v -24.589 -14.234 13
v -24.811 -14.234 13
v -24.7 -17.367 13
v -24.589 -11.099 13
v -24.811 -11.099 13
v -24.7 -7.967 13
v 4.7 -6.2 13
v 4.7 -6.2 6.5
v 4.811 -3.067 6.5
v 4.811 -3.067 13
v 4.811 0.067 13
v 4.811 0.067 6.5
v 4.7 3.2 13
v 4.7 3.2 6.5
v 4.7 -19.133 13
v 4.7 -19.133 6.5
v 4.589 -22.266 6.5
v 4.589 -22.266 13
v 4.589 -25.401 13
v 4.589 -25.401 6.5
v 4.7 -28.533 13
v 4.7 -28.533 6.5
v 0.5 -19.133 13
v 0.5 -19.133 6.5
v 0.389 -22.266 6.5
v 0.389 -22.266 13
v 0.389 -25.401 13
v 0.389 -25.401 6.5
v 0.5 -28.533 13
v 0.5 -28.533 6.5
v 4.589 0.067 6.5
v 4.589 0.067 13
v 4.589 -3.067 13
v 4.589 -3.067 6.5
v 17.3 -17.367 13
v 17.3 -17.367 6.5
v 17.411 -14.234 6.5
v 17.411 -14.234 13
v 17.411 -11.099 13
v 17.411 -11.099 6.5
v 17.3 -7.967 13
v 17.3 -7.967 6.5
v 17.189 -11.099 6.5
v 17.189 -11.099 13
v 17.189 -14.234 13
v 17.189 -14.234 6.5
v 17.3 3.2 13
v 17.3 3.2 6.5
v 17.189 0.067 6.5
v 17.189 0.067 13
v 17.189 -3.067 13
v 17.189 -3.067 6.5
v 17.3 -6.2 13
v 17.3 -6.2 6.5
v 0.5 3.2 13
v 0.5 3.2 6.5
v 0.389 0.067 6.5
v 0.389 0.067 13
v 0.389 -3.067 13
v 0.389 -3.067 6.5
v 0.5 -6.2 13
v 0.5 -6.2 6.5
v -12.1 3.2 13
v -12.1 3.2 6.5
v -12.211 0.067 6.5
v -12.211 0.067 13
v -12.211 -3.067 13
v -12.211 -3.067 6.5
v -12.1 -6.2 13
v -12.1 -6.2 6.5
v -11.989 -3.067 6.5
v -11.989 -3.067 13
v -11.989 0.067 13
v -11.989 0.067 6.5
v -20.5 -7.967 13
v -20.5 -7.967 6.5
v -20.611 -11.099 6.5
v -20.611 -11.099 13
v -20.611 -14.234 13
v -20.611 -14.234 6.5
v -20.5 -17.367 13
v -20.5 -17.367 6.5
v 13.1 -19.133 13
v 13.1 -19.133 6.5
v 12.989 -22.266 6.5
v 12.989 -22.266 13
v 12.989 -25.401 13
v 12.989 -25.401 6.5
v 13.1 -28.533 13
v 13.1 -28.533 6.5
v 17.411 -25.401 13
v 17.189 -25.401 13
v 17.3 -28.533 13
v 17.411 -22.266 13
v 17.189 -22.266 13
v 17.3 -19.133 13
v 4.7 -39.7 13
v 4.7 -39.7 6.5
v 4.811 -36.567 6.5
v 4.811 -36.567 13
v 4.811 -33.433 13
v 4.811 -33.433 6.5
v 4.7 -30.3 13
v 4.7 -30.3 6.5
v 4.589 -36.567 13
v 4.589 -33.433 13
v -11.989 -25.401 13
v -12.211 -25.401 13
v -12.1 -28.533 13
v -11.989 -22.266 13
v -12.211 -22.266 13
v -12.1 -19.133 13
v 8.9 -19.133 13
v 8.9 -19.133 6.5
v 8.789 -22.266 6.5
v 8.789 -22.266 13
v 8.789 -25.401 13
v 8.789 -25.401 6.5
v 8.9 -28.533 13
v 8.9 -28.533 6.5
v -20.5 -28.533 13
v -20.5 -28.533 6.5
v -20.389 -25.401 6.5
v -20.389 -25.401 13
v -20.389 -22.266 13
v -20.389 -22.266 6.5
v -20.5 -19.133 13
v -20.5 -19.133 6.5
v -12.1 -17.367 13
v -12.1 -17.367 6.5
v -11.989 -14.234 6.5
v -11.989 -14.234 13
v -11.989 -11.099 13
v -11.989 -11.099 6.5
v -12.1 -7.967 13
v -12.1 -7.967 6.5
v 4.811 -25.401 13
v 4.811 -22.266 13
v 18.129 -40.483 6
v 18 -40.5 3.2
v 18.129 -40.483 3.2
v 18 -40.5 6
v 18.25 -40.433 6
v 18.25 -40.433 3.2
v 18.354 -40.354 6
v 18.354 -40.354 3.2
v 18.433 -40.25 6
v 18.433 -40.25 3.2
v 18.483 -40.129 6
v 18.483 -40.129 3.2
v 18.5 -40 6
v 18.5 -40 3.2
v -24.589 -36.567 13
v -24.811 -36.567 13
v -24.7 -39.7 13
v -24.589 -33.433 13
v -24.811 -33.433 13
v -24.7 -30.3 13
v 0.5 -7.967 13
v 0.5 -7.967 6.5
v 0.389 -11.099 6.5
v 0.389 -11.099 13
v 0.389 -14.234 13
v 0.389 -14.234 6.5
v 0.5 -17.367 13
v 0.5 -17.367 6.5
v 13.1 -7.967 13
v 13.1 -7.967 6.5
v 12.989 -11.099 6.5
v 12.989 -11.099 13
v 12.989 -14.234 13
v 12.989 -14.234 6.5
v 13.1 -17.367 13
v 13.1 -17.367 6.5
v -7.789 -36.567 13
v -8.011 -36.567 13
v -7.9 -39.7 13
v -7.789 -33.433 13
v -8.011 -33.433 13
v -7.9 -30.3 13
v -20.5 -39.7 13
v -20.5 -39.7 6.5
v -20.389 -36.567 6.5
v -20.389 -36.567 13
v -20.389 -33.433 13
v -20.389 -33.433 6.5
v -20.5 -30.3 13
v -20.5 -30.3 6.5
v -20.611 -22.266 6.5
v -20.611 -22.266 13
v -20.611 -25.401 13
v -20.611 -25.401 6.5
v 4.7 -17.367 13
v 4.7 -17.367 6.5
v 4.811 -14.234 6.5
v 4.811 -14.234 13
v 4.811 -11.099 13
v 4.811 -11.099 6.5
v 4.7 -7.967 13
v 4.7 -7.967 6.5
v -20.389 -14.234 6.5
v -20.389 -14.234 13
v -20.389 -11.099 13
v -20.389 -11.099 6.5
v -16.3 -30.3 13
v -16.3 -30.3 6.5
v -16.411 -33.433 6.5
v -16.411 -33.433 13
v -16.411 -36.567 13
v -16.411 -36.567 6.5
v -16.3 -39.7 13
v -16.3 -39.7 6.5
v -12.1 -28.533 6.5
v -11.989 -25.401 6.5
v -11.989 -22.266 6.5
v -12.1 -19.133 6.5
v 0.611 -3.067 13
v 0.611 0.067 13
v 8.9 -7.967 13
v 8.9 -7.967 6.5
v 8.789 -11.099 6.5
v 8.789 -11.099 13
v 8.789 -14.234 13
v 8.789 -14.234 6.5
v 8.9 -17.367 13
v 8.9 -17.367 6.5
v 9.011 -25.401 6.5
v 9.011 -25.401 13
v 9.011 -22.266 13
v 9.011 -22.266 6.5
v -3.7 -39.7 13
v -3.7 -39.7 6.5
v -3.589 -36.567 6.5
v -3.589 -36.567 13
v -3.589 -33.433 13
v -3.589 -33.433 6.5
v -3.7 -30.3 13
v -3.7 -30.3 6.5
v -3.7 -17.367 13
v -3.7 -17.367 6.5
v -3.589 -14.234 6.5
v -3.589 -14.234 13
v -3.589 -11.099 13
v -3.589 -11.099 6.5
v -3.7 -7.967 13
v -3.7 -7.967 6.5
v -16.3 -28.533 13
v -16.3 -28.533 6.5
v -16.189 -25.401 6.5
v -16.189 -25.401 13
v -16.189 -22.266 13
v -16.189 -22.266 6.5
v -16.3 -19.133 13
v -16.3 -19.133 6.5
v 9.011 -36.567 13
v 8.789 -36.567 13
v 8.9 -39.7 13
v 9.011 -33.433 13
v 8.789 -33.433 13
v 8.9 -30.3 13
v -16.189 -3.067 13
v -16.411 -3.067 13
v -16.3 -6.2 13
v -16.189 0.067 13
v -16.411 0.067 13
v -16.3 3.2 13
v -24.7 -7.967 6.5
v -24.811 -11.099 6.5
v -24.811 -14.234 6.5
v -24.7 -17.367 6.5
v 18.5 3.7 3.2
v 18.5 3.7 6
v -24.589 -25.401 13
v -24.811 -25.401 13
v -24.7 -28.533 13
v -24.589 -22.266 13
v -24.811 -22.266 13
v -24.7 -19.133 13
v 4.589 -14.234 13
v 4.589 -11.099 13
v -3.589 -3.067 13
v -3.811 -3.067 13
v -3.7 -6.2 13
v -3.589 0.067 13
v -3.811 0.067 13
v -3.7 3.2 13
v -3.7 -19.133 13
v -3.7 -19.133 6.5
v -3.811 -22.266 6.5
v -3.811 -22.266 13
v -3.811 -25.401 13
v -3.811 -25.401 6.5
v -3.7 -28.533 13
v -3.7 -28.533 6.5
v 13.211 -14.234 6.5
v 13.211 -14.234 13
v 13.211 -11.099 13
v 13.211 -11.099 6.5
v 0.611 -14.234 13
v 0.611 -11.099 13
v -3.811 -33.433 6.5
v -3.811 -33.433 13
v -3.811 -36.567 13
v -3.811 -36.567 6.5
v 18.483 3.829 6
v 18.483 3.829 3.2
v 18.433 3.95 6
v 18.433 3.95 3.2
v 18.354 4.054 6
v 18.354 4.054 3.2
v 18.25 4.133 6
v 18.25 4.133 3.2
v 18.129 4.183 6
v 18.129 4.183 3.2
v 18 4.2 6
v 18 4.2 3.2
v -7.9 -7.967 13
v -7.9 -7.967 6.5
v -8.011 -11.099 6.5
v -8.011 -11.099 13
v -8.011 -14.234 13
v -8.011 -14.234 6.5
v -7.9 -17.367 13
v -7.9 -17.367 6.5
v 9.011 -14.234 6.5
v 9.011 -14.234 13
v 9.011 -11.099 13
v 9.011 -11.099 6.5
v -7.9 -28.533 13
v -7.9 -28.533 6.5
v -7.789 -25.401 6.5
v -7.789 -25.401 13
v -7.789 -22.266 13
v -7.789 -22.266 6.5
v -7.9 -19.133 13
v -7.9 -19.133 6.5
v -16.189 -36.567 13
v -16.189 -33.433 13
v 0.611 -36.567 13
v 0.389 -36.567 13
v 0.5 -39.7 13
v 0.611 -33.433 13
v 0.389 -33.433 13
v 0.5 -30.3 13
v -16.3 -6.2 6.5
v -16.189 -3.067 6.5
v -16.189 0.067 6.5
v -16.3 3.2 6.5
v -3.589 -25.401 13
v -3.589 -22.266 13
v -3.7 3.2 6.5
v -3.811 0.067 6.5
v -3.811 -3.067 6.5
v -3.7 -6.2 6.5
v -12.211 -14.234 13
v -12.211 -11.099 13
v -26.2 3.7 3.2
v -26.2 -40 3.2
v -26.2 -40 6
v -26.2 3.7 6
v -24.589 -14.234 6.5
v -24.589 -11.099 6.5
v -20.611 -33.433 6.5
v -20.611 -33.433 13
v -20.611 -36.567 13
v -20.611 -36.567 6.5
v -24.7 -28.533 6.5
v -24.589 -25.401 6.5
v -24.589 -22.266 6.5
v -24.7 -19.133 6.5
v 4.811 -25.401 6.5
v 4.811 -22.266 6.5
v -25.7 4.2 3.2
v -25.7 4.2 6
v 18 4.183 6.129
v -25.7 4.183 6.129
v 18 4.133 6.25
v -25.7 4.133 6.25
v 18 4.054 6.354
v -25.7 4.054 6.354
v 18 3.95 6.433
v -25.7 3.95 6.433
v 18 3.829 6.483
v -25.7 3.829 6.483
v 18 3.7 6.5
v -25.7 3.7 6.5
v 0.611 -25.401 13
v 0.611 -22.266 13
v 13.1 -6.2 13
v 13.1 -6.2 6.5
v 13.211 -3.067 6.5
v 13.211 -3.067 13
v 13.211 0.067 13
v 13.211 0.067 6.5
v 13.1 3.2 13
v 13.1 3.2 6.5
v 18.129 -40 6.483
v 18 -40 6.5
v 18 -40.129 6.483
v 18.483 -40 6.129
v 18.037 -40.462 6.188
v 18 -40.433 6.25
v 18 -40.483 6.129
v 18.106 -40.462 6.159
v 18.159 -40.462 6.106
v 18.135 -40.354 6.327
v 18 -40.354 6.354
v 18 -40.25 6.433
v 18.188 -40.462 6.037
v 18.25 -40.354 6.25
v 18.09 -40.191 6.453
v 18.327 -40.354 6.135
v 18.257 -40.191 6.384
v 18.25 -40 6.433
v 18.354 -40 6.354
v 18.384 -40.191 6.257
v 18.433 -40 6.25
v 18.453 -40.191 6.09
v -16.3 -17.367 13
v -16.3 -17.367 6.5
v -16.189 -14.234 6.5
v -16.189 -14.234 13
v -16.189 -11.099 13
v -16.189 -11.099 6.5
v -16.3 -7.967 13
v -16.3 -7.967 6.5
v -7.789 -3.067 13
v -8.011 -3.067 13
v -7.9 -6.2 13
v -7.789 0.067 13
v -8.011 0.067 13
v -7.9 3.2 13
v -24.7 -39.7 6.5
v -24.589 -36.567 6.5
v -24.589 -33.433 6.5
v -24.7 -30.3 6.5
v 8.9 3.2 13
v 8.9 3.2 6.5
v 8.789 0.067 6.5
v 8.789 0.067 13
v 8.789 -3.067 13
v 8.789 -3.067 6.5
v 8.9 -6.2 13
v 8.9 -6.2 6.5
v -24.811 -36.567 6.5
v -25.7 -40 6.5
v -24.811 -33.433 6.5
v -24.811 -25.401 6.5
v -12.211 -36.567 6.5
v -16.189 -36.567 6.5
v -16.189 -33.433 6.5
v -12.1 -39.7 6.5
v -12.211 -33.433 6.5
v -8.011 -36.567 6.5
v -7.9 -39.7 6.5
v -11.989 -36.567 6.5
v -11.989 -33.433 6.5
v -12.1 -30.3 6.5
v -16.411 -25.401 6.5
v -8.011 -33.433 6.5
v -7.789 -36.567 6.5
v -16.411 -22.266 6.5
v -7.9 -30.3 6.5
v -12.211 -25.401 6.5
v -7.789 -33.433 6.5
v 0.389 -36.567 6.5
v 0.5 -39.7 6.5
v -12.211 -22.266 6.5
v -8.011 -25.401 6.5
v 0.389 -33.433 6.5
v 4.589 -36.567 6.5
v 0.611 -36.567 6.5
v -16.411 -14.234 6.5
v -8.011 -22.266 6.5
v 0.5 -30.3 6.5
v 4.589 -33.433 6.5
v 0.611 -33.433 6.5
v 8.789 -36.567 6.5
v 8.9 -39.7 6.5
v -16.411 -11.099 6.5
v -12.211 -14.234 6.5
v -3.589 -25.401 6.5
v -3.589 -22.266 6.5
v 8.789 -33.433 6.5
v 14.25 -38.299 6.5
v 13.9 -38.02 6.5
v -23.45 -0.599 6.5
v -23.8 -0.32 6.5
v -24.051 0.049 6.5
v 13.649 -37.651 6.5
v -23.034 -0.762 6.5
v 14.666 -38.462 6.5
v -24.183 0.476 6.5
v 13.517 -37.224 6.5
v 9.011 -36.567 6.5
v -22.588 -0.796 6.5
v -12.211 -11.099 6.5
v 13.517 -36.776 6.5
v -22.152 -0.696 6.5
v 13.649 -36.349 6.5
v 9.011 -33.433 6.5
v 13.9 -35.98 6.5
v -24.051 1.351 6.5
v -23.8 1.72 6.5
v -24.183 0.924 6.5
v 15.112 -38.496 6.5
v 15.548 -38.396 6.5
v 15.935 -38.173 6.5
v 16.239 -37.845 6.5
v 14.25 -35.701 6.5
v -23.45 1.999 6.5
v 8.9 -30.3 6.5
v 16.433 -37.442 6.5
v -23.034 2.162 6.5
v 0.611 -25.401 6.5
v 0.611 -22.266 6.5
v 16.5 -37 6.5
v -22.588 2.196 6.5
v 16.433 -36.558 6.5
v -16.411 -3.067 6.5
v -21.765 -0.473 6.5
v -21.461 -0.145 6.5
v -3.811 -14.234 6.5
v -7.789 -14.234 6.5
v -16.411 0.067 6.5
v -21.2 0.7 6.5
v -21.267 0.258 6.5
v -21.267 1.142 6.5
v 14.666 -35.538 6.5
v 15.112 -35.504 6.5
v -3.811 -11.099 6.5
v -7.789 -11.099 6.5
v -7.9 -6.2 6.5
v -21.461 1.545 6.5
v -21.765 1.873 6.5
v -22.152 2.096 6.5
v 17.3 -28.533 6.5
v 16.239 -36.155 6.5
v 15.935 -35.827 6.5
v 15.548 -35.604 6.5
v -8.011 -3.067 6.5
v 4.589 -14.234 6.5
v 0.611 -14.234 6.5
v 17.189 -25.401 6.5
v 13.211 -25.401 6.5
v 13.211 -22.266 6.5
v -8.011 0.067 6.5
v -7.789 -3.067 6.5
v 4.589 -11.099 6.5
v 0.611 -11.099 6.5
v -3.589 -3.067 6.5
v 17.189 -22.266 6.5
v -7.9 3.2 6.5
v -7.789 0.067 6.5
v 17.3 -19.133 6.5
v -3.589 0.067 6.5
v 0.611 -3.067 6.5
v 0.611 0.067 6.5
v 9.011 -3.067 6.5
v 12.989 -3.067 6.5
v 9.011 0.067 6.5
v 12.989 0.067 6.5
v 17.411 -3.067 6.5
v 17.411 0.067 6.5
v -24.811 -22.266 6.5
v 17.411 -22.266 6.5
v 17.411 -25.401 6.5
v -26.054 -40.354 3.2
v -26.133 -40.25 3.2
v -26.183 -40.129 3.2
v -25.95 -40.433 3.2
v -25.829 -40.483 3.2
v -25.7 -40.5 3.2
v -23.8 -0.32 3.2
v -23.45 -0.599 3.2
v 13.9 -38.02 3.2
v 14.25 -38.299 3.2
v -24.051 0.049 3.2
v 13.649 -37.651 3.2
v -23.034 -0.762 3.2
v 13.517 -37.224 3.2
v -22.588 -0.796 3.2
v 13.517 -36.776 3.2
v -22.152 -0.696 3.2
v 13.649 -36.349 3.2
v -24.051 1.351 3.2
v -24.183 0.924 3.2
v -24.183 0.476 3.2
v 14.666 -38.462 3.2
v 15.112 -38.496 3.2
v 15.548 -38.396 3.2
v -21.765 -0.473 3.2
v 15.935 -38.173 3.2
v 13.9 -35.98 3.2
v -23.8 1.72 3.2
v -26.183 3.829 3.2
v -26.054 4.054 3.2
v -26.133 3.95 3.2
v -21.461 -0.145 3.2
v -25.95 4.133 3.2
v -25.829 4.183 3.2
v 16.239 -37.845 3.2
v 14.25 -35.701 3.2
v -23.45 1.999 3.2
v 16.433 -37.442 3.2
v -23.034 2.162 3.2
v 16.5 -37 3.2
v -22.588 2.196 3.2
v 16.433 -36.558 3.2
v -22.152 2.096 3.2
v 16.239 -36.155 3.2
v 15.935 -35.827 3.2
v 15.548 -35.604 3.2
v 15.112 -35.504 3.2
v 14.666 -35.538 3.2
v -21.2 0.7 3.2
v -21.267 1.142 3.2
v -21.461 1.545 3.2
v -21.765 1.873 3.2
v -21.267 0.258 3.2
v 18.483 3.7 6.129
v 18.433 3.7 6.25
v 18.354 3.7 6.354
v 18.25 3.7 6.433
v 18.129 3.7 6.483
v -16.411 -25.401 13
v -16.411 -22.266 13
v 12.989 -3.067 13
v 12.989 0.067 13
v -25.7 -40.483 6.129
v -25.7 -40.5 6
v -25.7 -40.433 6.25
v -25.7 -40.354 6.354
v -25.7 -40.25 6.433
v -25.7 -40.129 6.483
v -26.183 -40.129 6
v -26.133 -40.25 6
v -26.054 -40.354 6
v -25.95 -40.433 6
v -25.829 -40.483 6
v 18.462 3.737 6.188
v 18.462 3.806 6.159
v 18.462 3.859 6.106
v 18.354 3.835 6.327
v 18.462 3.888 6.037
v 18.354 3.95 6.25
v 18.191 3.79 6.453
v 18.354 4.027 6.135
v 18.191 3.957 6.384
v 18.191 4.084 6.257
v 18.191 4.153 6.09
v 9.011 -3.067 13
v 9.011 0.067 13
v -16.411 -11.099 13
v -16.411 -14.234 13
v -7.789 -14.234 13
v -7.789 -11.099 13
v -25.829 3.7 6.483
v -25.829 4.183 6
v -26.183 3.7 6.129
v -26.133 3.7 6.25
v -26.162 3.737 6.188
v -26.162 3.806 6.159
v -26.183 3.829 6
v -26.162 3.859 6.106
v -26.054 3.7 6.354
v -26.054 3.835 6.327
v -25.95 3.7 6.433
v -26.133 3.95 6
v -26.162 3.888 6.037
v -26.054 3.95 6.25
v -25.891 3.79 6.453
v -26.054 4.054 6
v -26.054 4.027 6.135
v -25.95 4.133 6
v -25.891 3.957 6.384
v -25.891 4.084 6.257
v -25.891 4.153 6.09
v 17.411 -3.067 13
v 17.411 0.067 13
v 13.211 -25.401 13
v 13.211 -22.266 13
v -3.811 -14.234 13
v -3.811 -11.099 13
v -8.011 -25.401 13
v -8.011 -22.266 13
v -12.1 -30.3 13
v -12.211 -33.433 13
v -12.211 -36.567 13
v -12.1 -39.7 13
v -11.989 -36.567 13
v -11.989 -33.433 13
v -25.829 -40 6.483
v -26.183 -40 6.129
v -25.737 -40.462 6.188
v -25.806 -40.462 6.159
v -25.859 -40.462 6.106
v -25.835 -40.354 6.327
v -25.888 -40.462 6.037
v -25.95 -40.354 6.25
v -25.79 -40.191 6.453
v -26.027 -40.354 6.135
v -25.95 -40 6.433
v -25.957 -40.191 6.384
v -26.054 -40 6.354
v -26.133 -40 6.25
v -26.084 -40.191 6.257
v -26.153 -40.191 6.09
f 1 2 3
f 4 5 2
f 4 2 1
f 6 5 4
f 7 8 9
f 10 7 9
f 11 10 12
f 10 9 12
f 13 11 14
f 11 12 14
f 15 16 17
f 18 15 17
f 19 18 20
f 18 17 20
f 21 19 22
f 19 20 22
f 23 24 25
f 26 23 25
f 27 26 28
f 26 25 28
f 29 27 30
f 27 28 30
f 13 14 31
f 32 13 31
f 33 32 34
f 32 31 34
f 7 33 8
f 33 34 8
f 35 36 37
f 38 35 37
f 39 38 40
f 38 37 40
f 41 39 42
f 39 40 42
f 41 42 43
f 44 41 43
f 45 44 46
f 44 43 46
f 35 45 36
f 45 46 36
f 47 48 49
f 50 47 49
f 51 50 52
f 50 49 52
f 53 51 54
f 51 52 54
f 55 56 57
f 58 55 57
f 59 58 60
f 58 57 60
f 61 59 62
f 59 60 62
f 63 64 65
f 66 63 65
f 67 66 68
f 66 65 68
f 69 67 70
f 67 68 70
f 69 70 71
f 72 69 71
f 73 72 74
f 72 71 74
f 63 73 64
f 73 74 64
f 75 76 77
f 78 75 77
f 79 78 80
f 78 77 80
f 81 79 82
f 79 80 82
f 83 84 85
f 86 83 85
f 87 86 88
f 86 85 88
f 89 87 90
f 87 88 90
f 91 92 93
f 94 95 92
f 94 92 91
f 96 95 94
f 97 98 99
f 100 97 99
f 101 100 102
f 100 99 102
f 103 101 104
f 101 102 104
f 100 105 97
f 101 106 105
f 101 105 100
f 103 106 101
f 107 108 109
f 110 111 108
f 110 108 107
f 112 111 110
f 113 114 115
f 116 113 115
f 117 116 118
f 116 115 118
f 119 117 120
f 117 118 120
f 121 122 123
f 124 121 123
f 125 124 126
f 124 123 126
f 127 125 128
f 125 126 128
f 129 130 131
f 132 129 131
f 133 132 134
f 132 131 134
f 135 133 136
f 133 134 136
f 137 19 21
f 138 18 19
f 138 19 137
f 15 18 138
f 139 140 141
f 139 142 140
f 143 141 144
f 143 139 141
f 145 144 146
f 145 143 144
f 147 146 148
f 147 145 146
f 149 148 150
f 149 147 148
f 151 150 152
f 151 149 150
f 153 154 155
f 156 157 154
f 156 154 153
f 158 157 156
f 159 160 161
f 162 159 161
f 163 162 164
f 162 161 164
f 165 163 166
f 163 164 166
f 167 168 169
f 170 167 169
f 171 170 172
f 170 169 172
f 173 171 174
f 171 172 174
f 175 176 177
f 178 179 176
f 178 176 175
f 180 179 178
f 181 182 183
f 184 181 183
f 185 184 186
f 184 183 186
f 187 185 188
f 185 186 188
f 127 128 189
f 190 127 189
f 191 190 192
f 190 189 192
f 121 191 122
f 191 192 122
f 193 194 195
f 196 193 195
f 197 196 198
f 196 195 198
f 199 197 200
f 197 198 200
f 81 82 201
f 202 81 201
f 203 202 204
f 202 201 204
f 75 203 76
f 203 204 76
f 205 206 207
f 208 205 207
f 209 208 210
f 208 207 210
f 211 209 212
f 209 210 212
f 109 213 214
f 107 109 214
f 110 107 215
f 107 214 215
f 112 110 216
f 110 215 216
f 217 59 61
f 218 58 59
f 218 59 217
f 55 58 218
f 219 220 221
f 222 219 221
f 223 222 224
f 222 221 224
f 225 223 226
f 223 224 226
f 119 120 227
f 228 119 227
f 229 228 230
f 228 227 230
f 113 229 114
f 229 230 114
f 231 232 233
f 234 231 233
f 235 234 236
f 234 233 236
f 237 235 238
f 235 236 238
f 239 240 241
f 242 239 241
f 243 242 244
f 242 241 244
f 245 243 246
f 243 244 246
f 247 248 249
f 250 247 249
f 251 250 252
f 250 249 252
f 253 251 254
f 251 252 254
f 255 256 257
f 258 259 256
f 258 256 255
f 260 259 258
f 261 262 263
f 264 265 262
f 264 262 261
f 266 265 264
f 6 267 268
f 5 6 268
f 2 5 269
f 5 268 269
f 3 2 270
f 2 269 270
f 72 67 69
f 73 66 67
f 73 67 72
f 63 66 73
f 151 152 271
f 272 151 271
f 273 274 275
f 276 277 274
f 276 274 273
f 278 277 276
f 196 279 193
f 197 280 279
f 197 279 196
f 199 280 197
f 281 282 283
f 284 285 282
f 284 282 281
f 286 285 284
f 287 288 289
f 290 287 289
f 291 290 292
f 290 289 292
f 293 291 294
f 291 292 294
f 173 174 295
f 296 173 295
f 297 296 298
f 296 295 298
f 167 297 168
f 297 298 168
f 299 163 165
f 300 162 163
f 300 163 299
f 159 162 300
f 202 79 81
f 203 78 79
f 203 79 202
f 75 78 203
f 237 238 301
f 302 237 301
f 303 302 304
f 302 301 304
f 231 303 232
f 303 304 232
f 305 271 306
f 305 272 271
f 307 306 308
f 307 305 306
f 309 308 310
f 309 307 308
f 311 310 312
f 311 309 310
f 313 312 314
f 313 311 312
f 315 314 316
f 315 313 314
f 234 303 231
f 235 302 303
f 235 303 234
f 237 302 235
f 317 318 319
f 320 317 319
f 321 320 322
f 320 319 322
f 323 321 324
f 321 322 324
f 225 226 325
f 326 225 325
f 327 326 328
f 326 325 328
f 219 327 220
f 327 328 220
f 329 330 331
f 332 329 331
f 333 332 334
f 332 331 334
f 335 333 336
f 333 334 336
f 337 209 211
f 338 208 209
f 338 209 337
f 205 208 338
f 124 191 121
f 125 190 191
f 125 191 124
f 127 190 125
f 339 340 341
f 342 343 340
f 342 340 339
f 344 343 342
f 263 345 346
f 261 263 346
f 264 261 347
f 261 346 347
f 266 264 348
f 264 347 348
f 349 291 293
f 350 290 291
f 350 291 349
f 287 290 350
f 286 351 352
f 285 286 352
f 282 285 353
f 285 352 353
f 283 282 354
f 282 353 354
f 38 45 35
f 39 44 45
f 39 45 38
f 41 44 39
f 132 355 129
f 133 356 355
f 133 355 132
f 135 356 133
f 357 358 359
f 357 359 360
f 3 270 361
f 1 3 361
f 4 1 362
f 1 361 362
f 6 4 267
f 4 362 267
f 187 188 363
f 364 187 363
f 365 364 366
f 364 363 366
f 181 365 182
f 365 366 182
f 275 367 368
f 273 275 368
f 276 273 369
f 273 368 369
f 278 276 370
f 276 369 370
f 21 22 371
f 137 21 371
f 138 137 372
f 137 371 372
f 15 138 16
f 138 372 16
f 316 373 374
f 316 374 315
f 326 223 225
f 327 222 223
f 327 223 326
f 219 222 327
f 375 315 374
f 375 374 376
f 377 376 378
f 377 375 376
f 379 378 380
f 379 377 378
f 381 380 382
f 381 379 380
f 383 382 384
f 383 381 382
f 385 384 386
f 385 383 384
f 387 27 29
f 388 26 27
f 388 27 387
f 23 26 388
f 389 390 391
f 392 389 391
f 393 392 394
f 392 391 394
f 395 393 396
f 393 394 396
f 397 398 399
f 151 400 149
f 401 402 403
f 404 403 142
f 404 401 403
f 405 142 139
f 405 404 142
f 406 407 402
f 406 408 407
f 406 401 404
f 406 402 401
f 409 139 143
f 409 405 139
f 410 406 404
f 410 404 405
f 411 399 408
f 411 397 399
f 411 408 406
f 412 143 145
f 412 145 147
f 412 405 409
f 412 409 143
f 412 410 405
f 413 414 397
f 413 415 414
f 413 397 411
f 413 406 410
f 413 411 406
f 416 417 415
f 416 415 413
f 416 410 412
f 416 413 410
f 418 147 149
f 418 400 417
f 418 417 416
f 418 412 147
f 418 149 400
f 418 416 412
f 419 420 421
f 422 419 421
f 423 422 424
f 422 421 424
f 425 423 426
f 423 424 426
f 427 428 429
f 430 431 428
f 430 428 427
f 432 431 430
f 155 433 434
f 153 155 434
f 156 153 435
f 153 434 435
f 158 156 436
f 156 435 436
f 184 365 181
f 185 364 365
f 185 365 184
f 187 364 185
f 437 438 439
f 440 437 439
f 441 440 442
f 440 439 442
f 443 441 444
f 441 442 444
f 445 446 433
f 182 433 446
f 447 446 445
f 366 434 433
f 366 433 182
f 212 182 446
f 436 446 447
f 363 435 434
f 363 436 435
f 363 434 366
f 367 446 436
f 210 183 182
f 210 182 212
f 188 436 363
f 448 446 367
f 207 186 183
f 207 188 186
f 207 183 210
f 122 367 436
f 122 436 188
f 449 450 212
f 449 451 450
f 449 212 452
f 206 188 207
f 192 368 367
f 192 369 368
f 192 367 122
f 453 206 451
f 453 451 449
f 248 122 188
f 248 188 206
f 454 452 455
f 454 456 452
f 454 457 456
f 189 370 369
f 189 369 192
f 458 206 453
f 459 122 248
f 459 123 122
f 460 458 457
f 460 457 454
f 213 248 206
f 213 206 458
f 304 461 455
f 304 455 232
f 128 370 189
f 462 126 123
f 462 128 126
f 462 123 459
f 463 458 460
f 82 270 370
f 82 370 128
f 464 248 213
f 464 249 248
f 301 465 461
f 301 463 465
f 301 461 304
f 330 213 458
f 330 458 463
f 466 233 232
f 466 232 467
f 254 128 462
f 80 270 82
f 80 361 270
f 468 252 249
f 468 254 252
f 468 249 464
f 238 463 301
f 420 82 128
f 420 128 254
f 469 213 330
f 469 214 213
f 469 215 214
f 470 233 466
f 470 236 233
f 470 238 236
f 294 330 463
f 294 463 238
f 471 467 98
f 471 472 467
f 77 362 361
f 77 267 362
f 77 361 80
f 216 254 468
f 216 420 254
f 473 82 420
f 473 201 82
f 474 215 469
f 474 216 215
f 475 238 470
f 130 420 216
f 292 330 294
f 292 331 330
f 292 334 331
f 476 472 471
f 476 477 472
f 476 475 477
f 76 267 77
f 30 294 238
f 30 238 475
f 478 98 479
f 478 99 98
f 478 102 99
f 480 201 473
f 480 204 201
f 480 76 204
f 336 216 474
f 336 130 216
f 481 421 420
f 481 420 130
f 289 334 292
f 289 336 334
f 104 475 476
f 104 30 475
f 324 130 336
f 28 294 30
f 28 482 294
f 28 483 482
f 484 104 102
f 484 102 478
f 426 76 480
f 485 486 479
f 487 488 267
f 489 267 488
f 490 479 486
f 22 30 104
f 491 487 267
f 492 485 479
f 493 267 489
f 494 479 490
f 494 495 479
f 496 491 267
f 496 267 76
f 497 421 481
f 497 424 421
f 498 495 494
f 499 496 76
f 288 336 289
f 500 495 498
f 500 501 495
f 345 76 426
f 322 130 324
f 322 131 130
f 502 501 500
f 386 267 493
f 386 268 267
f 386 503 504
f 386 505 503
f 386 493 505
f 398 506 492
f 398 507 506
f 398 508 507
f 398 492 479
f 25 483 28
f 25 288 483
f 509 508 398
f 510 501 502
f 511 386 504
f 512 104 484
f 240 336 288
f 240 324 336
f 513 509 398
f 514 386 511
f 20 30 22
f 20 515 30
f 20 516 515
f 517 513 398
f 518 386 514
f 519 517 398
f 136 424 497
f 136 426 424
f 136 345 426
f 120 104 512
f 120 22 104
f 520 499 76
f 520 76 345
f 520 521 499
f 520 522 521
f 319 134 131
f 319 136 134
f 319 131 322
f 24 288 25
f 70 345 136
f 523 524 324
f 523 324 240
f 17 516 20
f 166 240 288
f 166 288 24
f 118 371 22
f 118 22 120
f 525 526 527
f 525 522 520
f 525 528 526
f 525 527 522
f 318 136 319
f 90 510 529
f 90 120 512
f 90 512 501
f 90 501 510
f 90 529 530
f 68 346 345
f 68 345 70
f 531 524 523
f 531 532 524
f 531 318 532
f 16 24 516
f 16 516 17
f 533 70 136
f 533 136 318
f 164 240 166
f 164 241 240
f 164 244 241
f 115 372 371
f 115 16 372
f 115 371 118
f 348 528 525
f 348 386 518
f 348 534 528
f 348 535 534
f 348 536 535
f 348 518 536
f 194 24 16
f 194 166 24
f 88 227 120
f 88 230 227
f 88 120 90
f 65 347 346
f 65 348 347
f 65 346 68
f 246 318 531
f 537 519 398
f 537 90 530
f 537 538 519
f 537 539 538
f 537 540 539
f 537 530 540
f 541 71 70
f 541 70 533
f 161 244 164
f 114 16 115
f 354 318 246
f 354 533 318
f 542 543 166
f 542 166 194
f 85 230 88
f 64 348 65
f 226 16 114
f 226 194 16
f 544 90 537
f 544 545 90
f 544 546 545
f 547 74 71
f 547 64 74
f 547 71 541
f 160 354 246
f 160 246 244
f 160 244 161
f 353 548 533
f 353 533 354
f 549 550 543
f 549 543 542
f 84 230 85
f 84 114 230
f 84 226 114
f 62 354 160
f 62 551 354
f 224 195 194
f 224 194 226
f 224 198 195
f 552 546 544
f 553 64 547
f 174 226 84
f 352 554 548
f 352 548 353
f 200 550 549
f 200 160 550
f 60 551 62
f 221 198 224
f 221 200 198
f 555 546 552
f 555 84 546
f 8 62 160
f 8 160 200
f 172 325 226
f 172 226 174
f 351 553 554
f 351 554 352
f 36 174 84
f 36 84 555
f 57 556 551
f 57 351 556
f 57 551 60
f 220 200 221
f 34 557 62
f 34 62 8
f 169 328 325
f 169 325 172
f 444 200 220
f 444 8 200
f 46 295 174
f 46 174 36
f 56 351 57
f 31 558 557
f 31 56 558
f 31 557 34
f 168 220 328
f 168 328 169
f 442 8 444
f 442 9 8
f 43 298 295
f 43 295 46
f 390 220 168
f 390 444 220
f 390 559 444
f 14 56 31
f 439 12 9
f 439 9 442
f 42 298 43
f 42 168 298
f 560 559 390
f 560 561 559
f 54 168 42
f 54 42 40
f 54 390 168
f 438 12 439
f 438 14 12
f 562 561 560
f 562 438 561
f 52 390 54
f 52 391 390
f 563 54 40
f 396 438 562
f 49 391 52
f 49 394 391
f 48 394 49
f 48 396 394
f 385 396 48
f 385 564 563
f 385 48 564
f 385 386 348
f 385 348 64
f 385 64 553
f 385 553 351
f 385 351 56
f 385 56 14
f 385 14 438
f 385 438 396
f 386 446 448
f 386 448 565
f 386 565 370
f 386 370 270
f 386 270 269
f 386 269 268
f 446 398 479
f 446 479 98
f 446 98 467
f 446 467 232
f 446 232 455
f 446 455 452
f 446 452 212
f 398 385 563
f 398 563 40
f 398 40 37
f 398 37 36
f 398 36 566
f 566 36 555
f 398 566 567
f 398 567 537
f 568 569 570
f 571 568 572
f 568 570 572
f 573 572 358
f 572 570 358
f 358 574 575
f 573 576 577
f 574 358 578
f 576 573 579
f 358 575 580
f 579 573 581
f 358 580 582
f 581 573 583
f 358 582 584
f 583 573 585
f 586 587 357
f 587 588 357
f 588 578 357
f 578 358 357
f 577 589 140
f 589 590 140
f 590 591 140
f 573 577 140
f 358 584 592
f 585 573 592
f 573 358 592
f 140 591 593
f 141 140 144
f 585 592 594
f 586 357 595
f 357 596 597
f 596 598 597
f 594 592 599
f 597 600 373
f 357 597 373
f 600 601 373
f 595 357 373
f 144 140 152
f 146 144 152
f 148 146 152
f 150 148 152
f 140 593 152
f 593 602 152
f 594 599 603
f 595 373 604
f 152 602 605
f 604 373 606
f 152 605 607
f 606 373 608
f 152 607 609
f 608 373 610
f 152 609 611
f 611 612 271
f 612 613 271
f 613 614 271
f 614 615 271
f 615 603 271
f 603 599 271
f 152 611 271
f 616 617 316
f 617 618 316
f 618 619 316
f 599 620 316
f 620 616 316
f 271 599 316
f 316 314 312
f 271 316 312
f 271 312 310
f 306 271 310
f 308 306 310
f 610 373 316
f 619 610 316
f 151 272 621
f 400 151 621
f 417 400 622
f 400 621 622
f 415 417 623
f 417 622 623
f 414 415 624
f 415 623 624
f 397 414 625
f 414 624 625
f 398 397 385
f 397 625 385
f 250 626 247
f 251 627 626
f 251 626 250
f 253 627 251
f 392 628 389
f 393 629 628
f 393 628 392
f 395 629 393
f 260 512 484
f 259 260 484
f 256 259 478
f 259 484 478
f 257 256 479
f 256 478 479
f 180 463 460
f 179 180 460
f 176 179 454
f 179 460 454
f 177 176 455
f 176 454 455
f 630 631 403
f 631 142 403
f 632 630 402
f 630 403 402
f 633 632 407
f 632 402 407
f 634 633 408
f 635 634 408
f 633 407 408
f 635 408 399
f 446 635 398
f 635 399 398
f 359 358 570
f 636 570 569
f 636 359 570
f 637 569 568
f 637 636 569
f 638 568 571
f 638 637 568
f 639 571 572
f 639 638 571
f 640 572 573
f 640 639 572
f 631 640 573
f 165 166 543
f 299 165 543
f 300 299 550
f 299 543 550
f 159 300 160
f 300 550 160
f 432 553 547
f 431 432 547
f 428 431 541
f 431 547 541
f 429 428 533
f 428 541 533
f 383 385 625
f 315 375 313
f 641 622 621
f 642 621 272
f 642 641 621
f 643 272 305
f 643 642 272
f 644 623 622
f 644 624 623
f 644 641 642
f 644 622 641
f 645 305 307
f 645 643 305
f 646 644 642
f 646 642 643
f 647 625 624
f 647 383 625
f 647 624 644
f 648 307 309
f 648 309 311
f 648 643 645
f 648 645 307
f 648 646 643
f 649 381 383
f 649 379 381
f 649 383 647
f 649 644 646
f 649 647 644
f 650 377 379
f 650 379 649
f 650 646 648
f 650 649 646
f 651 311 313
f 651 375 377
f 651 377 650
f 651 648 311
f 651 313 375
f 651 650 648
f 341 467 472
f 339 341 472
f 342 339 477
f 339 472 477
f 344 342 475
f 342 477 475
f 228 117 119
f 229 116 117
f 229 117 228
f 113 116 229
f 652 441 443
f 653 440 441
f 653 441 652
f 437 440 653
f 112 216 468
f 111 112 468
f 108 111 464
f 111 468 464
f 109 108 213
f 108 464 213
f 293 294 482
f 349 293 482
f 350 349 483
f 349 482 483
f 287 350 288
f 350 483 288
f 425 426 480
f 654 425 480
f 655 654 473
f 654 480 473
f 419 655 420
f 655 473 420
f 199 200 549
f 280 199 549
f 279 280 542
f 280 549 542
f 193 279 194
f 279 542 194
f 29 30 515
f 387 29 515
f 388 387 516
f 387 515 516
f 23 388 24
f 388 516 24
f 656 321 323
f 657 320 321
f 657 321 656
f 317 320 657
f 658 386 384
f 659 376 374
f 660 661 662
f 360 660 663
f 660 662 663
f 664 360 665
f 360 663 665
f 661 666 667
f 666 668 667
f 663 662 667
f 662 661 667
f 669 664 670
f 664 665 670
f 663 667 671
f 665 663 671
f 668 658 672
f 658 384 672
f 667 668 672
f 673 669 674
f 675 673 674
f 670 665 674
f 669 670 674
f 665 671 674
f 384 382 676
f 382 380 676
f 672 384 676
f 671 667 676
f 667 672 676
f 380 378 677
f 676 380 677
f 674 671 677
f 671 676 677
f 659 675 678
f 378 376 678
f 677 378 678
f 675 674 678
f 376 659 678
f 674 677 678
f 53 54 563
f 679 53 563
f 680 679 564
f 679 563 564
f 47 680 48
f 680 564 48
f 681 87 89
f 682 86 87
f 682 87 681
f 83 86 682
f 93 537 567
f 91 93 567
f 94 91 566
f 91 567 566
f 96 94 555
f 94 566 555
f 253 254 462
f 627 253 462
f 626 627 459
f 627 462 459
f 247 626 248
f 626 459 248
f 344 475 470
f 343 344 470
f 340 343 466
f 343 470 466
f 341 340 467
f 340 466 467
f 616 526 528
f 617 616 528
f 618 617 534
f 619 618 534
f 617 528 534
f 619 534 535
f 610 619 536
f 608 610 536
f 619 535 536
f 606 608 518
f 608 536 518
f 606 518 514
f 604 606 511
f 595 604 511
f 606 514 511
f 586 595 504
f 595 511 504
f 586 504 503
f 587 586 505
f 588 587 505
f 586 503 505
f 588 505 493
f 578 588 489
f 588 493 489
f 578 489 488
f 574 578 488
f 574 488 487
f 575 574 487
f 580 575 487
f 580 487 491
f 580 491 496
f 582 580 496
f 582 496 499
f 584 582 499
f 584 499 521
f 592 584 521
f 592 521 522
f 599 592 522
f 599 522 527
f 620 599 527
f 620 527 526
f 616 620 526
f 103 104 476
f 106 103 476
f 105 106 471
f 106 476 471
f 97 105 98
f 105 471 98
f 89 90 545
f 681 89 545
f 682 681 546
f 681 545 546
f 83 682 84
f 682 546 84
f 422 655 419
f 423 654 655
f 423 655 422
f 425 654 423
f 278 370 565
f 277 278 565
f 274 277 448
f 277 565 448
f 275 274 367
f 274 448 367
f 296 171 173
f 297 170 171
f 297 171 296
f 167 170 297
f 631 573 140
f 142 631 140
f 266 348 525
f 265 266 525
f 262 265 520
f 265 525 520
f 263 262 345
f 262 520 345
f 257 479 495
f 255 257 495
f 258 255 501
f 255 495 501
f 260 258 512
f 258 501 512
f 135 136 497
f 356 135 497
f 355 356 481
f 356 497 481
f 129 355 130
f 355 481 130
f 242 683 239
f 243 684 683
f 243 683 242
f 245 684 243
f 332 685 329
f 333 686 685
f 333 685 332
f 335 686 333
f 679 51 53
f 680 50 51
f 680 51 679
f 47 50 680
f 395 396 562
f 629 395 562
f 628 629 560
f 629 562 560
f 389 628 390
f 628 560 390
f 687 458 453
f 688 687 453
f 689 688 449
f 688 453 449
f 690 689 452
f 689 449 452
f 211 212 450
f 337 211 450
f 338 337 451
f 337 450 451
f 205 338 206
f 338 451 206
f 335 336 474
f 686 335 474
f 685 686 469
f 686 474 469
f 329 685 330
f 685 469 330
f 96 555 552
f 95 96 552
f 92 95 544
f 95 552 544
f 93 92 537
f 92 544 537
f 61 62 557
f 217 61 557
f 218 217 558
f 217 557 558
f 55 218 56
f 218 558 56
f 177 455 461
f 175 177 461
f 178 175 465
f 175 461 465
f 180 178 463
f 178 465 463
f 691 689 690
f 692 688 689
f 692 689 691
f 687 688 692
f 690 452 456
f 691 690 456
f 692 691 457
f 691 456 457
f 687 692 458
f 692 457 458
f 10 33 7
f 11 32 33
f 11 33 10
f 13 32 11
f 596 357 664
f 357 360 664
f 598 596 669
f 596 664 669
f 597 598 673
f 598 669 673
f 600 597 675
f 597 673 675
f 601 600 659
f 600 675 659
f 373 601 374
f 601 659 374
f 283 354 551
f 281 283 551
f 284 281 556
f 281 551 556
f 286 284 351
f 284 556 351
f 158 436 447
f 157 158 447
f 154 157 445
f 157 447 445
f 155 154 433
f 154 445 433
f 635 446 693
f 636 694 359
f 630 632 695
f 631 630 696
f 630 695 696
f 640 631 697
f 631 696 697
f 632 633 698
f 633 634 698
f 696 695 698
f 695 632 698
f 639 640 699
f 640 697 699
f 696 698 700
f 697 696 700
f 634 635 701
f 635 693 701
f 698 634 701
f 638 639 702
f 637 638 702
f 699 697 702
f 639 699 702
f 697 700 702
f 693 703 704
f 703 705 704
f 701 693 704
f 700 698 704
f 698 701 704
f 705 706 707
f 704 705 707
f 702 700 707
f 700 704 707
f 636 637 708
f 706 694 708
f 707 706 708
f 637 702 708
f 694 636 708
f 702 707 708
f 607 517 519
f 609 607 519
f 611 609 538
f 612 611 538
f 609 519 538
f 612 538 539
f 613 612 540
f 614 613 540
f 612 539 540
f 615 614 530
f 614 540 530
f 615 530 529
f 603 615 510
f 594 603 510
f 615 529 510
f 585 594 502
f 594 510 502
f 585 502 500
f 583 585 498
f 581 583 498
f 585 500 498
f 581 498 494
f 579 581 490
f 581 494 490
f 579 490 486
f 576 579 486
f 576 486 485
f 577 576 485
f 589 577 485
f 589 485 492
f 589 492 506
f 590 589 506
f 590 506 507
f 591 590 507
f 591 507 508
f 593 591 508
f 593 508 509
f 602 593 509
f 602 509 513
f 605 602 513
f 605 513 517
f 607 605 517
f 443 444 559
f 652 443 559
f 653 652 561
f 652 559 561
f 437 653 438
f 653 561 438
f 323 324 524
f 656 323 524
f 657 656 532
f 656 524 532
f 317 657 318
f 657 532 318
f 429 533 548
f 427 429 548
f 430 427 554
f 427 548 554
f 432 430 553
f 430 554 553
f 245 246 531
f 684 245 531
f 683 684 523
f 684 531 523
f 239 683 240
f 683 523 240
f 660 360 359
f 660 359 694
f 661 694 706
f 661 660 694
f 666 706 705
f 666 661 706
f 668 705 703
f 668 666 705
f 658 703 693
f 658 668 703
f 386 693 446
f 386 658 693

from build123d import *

# Parameters (mm, degrees)
SKETCH011_W                   = 44.7
SKETCH011_H                   = 44.7
PAD006_DEPTH                  = 3.3
FILLET001_R                   = 0.5
PAD007_DEPTH                  = 6.5
PAD007_LINEARPATTERN_2_DEPTH  = 6.5
PAD007_LINEARPATTERN_3_DEPTH  = 6.5
PAD007_LINEARPATTERN_4_DEPTH  = 6.5
PAD007_LINEARPATTERN_5_DEPTH  = 6.5
PAD007_LINEARPATTERN_6_DEPTH  = 6.5
PAD007_LINEARPATTERN_7_DEPTH  = 6.5
PAD007_LINEARPATTERN_8_DEPTH  = 6.5
PAD007_LINEARPATTERN_9_DEPTH  = 6.5
PAD007_LINEARPATTERN_10_DEPTH = 6.5
PAD007_LINEARPATTERN_11_DEPTH = 6.5
LINEARPATTERN001_COUNT        = 4
LINEARPATTERN001_PITCH        = 11.1666666667
SKETCH013_W                   = 4.44947025
SKETCH013_H                   = 9.881485
POCKET006_DEPTH               = 6.5
SKETCH014_W                   = 4.44947025
SKETCH014_H                   = 9.4
POCKET007_DEPTH               = 6.5
SKETCH015_R                   = 1.5
POCKET008_DEPTH               = 3.301


with BuildPart() as part:
    # Sketch011 → Pad006 (new body)
    with BuildSketch(Plane.XY):
        with Locations((-3.85, -18.15)):
            Rectangle(SKETCH011_W, SKETCH011_H)
    extrude(amount=PAD006_DEPTH)

    # Fillet001
    fillet001_edges = [part.edges().sort_by_distance(p)[0] for p in [
        (-3.85, 4.2, 3.3),
        (-26.2, -18.15, 3.3),
        (18.5, -18.15, 3.3),
        (-3.85, -40.5, 3.3),
        (-26.2, 4.2, 1.65),
        (-26.2, -40.5, 1.65),
        (18.5, 4.2, 1.65),
        (18.5, -40.5, 1.65),
    ]]
    fillet(fillet001_edges, radius=FILLET001_R)

    # Sketch012 (on Face13 of Fillet001) → Pad007 (join)
    with BuildSketch(Plane.XY.offset(3.3)):
        with BuildLine():
            ThreePointArc((-24.7, -6.2), (-24.575264875, -1.5), (-24.7, 3.2))
            ThreePointArc((-24.7, 3.2), (-24.824735125, -1.5), (-24.7, -6.2))
        make_face()
    pad007 = extrude(amount=PAD007_DEPTH)

    # Sketch012 LinearPattern 2 → Pad007 LinearPattern 2 (add)
    with BuildSketch(Plane(origin=(4.2, 0, 3.3), x_dir=(1, 0, 0), z_dir=(0, 0, 1))):
        with BuildLine():
            ThreePointArc((-24.7, -6.2), (-24.575264875, -1.5), (-24.7, 3.2))
            ThreePointArc((-24.7, 3.2), (-24.824735125, -1.5), (-24.7, -6.2))
        make_face()
    pad007_linearpattern_2 = extrude(amount=PAD007_LINEARPATTERN_2_DEPTH)

    # Sketch012 LinearPattern 3 → Pad007 LinearPattern 3 (add)
    with BuildSketch(Plane(origin=(8.4, 0, 3.3), x_dir=(1, 0, 0), z_dir=(0, 0, 1))):
        with BuildLine():
            ThreePointArc((-24.7, -6.2), (-24.575264875, -1.5), (-24.7, 3.2))
            ThreePointArc((-24.7, 3.2), (-24.824735125, -1.5), (-24.7, -6.2))
        make_face()
    pad007_linearpattern_3 = extrude(amount=PAD007_LINEARPATTERN_3_DEPTH)

    # Sketch012 LinearPattern 4 → Pad007 LinearPattern 4 (add)
    with BuildSketch(Plane(origin=(12.6, 0, 3.3), x_dir=(1, 0, 0), z_dir=(0, 0, 1))):
        with BuildLine():
            ThreePointArc((-24.7, -6.2), (-24.575264875, -1.5), (-24.7, 3.2))
            ThreePointArc((-24.7, 3.2), (-24.824735125, -1.5), (-24.7, -6.2))
        make_face()
    pad007_linearpattern_4 = extrude(amount=PAD007_LINEARPATTERN_4_DEPTH)

    # Sketch012 LinearPattern 5 → Pad007 LinearPattern 5 (add)
    with BuildSketch(Plane(origin=(16.8, 0, 3.3), x_dir=(1, 0, 0), z_dir=(0, 0, 1))):
        with BuildLine():
            ThreePointArc((-24.7, -6.2), (-24.575264875, -1.5), (-24.7, 3.2))
            ThreePointArc((-24.7, 3.2), (-24.824735125, -1.5), (-24.7, -6.2))
        make_face()
    pad007_linearpattern_5 = extrude(amount=PAD007_LINEARPATTERN_5_DEPTH)

    # Sketch012 LinearPattern 6 → Pad007 LinearPattern 6 (add)
    with BuildSketch(Plane(origin=(21, 0, 3.3), x_dir=(1, 0, 0), z_dir=(0, 0, 1))):
        with BuildLine():
            ThreePointArc((-24.7, -6.2), (-24.575264875, -1.5), (-24.7, 3.2))
            ThreePointArc((-24.7, 3.2), (-24.824735125, -1.5), (-24.7, -6.2))
        make_face()
    pad007_linearpattern_6 = extrude(amount=PAD007_LINEARPATTERN_6_DEPTH)

    # Sketch012 LinearPattern 7 → Pad007 LinearPattern 7 (add)
    with BuildSketch(Plane(origin=(25.2, 0, 3.3), x_dir=(1, 0, 0), z_dir=(0, 0, 1))):
        with BuildLine():
            ThreePointArc((-24.7, -6.2), (-24.575264875, -1.5), (-24.7, 3.2))
            ThreePointArc((-24.7, 3.2), (-24.824735125, -1.5), (-24.7, -6.2))
        make_face()
    pad007_linearpattern_7 = extrude(amount=PAD007_LINEARPATTERN_7_DEPTH)

    # Sketch012 LinearPattern 8 → Pad007 LinearPattern 8 (add)
    with BuildSketch(Plane(origin=(29.4, 0, 3.3), x_dir=(1, 0, 0), z_dir=(0, 0, 1))):
        with BuildLine():
            ThreePointArc((-24.7, -6.2), (-24.575264875, -1.5), (-24.7, 3.2))
            ThreePointArc((-24.7, 3.2), (-24.824735125, -1.5), (-24.7, -6.2))
        make_face()
    pad007_linearpattern_8 = extrude(amount=PAD007_LINEARPATTERN_8_DEPTH)

    # Sketch012 LinearPattern 9 → Pad007 LinearPattern 9 (add)
    with BuildSketch(Plane(origin=(33.6, 0, 3.3), x_dir=(1, 0, 0), z_dir=(0, 0, 1))):
        with BuildLine():
            ThreePointArc((-24.7, -6.2), (-24.575264875, -1.5), (-24.7, 3.2))
            ThreePointArc((-24.7, 3.2), (-24.824735125, -1.5), (-24.7, -6.2))
        make_face()
    pad007_linearpattern_9 = extrude(amount=PAD007_LINEARPATTERN_9_DEPTH)

    # Sketch012 LinearPattern 10 → Pad007 LinearPattern 10 (add)
    with BuildSketch(Plane(origin=(37.8, 0, 3.3), x_dir=(1, 0, 0), z_dir=(0, 0, 1))):
        with BuildLine():
            ThreePointArc((-24.7, -6.2), (-24.575264875, -1.5), (-24.7, 3.2))
            ThreePointArc((-24.7, 3.2), (-24.824735125, -1.5), (-24.7, -6.2))
        make_face()
    pad007_linearpattern_10 = extrude(amount=PAD007_LINEARPATTERN_10_DEPTH)

    # Sketch012 LinearPattern 11 → Pad007 LinearPattern 11 (add)
    with BuildSketch(Plane(origin=(42, 0, 3.3), x_dir=(1, 0, 0), z_dir=(0, 0, 1))):
        with BuildLine():
            ThreePointArc((-24.7, -6.2), (-24.575264875, -1.5), (-24.7, 3.2))
            ThreePointArc((-24.7, 3.2), (-24.824735125, -1.5), (-24.7, -6.2))
        make_face()
    pad007_linearpattern_11 = extrude(amount=PAD007_LINEARPATTERN_11_DEPTH)

    # LinearPattern001: Pad007, Pad007 LinearPattern 2, Pad007 LinearPattern 3, Pad007 LinearPattern 4, Pad007 LinearPattern 5, Pad007 LinearPattern 6, Pad007 LinearPattern 7, Pad007 LinearPattern 8, Pad007 LinearPattern 9, Pad007 LinearPattern 10, Pad007 LinearPattern 11 ×4
    with Locations(*[(0, -i * LINEARPATTERN001_PITCH, 0) for i in range(1, LINEARPATTERN001_COUNT)]):
        add(pad007)
        add(pad007_linearpattern_2)
        add(pad007_linearpattern_3)
        add(pad007_linearpattern_4)
        add(pad007_linearpattern_5)
        add(pad007_linearpattern_6)
        add(pad007_linearpattern_7)
        add(pad007_linearpattern_8)
        add(pad007_linearpattern_9)
        add(pad007_linearpattern_10)
        add(pad007_linearpattern_11)

    # Sketch013 (on Face147 of MultiTransform001) → Pocket006 (cut)
    with BuildSketch(Plane.XY.offset(9.8)):
        with Locations((-22.6, -1.7407425)):
            Rectangle(SKETCH013_W, SKETCH013_H)
    extrude(amount=-POCKET006_DEPTH, mode=Mode.SUBTRACT)

    # Sketch014 (on Face125 of Pocket006) → Pocket007 (cut)
    with BuildSketch(Plane.XY.offset(9.8)):
        with Locations((15.2, -35)):
            Rectangle(SKETCH014_W, SKETCH014_H)
    extrude(amount=-POCKET007_DEPTH, mode=Mode.SUBTRACT)

    # Sketch015 (on Face13 of Pocket007) → Pocket008 (cut, through all)
    with BuildSketch(Plane.XY.offset(3.3)):
        with Locations((-22.7, 0.7)):
            Circle(SKETCH015_R)
        with Locations((15, -37)):
            Circle(SKETCH015_R)
    extrude(amount=-POCKET008_DEPTH, mode=Mode.SUBTRACT)


with BuildPart() as part_1:
    # Body002 placement: moved
    add(part.part.moved(Location((0, 0, 3.2))))


solid = part_1.part
